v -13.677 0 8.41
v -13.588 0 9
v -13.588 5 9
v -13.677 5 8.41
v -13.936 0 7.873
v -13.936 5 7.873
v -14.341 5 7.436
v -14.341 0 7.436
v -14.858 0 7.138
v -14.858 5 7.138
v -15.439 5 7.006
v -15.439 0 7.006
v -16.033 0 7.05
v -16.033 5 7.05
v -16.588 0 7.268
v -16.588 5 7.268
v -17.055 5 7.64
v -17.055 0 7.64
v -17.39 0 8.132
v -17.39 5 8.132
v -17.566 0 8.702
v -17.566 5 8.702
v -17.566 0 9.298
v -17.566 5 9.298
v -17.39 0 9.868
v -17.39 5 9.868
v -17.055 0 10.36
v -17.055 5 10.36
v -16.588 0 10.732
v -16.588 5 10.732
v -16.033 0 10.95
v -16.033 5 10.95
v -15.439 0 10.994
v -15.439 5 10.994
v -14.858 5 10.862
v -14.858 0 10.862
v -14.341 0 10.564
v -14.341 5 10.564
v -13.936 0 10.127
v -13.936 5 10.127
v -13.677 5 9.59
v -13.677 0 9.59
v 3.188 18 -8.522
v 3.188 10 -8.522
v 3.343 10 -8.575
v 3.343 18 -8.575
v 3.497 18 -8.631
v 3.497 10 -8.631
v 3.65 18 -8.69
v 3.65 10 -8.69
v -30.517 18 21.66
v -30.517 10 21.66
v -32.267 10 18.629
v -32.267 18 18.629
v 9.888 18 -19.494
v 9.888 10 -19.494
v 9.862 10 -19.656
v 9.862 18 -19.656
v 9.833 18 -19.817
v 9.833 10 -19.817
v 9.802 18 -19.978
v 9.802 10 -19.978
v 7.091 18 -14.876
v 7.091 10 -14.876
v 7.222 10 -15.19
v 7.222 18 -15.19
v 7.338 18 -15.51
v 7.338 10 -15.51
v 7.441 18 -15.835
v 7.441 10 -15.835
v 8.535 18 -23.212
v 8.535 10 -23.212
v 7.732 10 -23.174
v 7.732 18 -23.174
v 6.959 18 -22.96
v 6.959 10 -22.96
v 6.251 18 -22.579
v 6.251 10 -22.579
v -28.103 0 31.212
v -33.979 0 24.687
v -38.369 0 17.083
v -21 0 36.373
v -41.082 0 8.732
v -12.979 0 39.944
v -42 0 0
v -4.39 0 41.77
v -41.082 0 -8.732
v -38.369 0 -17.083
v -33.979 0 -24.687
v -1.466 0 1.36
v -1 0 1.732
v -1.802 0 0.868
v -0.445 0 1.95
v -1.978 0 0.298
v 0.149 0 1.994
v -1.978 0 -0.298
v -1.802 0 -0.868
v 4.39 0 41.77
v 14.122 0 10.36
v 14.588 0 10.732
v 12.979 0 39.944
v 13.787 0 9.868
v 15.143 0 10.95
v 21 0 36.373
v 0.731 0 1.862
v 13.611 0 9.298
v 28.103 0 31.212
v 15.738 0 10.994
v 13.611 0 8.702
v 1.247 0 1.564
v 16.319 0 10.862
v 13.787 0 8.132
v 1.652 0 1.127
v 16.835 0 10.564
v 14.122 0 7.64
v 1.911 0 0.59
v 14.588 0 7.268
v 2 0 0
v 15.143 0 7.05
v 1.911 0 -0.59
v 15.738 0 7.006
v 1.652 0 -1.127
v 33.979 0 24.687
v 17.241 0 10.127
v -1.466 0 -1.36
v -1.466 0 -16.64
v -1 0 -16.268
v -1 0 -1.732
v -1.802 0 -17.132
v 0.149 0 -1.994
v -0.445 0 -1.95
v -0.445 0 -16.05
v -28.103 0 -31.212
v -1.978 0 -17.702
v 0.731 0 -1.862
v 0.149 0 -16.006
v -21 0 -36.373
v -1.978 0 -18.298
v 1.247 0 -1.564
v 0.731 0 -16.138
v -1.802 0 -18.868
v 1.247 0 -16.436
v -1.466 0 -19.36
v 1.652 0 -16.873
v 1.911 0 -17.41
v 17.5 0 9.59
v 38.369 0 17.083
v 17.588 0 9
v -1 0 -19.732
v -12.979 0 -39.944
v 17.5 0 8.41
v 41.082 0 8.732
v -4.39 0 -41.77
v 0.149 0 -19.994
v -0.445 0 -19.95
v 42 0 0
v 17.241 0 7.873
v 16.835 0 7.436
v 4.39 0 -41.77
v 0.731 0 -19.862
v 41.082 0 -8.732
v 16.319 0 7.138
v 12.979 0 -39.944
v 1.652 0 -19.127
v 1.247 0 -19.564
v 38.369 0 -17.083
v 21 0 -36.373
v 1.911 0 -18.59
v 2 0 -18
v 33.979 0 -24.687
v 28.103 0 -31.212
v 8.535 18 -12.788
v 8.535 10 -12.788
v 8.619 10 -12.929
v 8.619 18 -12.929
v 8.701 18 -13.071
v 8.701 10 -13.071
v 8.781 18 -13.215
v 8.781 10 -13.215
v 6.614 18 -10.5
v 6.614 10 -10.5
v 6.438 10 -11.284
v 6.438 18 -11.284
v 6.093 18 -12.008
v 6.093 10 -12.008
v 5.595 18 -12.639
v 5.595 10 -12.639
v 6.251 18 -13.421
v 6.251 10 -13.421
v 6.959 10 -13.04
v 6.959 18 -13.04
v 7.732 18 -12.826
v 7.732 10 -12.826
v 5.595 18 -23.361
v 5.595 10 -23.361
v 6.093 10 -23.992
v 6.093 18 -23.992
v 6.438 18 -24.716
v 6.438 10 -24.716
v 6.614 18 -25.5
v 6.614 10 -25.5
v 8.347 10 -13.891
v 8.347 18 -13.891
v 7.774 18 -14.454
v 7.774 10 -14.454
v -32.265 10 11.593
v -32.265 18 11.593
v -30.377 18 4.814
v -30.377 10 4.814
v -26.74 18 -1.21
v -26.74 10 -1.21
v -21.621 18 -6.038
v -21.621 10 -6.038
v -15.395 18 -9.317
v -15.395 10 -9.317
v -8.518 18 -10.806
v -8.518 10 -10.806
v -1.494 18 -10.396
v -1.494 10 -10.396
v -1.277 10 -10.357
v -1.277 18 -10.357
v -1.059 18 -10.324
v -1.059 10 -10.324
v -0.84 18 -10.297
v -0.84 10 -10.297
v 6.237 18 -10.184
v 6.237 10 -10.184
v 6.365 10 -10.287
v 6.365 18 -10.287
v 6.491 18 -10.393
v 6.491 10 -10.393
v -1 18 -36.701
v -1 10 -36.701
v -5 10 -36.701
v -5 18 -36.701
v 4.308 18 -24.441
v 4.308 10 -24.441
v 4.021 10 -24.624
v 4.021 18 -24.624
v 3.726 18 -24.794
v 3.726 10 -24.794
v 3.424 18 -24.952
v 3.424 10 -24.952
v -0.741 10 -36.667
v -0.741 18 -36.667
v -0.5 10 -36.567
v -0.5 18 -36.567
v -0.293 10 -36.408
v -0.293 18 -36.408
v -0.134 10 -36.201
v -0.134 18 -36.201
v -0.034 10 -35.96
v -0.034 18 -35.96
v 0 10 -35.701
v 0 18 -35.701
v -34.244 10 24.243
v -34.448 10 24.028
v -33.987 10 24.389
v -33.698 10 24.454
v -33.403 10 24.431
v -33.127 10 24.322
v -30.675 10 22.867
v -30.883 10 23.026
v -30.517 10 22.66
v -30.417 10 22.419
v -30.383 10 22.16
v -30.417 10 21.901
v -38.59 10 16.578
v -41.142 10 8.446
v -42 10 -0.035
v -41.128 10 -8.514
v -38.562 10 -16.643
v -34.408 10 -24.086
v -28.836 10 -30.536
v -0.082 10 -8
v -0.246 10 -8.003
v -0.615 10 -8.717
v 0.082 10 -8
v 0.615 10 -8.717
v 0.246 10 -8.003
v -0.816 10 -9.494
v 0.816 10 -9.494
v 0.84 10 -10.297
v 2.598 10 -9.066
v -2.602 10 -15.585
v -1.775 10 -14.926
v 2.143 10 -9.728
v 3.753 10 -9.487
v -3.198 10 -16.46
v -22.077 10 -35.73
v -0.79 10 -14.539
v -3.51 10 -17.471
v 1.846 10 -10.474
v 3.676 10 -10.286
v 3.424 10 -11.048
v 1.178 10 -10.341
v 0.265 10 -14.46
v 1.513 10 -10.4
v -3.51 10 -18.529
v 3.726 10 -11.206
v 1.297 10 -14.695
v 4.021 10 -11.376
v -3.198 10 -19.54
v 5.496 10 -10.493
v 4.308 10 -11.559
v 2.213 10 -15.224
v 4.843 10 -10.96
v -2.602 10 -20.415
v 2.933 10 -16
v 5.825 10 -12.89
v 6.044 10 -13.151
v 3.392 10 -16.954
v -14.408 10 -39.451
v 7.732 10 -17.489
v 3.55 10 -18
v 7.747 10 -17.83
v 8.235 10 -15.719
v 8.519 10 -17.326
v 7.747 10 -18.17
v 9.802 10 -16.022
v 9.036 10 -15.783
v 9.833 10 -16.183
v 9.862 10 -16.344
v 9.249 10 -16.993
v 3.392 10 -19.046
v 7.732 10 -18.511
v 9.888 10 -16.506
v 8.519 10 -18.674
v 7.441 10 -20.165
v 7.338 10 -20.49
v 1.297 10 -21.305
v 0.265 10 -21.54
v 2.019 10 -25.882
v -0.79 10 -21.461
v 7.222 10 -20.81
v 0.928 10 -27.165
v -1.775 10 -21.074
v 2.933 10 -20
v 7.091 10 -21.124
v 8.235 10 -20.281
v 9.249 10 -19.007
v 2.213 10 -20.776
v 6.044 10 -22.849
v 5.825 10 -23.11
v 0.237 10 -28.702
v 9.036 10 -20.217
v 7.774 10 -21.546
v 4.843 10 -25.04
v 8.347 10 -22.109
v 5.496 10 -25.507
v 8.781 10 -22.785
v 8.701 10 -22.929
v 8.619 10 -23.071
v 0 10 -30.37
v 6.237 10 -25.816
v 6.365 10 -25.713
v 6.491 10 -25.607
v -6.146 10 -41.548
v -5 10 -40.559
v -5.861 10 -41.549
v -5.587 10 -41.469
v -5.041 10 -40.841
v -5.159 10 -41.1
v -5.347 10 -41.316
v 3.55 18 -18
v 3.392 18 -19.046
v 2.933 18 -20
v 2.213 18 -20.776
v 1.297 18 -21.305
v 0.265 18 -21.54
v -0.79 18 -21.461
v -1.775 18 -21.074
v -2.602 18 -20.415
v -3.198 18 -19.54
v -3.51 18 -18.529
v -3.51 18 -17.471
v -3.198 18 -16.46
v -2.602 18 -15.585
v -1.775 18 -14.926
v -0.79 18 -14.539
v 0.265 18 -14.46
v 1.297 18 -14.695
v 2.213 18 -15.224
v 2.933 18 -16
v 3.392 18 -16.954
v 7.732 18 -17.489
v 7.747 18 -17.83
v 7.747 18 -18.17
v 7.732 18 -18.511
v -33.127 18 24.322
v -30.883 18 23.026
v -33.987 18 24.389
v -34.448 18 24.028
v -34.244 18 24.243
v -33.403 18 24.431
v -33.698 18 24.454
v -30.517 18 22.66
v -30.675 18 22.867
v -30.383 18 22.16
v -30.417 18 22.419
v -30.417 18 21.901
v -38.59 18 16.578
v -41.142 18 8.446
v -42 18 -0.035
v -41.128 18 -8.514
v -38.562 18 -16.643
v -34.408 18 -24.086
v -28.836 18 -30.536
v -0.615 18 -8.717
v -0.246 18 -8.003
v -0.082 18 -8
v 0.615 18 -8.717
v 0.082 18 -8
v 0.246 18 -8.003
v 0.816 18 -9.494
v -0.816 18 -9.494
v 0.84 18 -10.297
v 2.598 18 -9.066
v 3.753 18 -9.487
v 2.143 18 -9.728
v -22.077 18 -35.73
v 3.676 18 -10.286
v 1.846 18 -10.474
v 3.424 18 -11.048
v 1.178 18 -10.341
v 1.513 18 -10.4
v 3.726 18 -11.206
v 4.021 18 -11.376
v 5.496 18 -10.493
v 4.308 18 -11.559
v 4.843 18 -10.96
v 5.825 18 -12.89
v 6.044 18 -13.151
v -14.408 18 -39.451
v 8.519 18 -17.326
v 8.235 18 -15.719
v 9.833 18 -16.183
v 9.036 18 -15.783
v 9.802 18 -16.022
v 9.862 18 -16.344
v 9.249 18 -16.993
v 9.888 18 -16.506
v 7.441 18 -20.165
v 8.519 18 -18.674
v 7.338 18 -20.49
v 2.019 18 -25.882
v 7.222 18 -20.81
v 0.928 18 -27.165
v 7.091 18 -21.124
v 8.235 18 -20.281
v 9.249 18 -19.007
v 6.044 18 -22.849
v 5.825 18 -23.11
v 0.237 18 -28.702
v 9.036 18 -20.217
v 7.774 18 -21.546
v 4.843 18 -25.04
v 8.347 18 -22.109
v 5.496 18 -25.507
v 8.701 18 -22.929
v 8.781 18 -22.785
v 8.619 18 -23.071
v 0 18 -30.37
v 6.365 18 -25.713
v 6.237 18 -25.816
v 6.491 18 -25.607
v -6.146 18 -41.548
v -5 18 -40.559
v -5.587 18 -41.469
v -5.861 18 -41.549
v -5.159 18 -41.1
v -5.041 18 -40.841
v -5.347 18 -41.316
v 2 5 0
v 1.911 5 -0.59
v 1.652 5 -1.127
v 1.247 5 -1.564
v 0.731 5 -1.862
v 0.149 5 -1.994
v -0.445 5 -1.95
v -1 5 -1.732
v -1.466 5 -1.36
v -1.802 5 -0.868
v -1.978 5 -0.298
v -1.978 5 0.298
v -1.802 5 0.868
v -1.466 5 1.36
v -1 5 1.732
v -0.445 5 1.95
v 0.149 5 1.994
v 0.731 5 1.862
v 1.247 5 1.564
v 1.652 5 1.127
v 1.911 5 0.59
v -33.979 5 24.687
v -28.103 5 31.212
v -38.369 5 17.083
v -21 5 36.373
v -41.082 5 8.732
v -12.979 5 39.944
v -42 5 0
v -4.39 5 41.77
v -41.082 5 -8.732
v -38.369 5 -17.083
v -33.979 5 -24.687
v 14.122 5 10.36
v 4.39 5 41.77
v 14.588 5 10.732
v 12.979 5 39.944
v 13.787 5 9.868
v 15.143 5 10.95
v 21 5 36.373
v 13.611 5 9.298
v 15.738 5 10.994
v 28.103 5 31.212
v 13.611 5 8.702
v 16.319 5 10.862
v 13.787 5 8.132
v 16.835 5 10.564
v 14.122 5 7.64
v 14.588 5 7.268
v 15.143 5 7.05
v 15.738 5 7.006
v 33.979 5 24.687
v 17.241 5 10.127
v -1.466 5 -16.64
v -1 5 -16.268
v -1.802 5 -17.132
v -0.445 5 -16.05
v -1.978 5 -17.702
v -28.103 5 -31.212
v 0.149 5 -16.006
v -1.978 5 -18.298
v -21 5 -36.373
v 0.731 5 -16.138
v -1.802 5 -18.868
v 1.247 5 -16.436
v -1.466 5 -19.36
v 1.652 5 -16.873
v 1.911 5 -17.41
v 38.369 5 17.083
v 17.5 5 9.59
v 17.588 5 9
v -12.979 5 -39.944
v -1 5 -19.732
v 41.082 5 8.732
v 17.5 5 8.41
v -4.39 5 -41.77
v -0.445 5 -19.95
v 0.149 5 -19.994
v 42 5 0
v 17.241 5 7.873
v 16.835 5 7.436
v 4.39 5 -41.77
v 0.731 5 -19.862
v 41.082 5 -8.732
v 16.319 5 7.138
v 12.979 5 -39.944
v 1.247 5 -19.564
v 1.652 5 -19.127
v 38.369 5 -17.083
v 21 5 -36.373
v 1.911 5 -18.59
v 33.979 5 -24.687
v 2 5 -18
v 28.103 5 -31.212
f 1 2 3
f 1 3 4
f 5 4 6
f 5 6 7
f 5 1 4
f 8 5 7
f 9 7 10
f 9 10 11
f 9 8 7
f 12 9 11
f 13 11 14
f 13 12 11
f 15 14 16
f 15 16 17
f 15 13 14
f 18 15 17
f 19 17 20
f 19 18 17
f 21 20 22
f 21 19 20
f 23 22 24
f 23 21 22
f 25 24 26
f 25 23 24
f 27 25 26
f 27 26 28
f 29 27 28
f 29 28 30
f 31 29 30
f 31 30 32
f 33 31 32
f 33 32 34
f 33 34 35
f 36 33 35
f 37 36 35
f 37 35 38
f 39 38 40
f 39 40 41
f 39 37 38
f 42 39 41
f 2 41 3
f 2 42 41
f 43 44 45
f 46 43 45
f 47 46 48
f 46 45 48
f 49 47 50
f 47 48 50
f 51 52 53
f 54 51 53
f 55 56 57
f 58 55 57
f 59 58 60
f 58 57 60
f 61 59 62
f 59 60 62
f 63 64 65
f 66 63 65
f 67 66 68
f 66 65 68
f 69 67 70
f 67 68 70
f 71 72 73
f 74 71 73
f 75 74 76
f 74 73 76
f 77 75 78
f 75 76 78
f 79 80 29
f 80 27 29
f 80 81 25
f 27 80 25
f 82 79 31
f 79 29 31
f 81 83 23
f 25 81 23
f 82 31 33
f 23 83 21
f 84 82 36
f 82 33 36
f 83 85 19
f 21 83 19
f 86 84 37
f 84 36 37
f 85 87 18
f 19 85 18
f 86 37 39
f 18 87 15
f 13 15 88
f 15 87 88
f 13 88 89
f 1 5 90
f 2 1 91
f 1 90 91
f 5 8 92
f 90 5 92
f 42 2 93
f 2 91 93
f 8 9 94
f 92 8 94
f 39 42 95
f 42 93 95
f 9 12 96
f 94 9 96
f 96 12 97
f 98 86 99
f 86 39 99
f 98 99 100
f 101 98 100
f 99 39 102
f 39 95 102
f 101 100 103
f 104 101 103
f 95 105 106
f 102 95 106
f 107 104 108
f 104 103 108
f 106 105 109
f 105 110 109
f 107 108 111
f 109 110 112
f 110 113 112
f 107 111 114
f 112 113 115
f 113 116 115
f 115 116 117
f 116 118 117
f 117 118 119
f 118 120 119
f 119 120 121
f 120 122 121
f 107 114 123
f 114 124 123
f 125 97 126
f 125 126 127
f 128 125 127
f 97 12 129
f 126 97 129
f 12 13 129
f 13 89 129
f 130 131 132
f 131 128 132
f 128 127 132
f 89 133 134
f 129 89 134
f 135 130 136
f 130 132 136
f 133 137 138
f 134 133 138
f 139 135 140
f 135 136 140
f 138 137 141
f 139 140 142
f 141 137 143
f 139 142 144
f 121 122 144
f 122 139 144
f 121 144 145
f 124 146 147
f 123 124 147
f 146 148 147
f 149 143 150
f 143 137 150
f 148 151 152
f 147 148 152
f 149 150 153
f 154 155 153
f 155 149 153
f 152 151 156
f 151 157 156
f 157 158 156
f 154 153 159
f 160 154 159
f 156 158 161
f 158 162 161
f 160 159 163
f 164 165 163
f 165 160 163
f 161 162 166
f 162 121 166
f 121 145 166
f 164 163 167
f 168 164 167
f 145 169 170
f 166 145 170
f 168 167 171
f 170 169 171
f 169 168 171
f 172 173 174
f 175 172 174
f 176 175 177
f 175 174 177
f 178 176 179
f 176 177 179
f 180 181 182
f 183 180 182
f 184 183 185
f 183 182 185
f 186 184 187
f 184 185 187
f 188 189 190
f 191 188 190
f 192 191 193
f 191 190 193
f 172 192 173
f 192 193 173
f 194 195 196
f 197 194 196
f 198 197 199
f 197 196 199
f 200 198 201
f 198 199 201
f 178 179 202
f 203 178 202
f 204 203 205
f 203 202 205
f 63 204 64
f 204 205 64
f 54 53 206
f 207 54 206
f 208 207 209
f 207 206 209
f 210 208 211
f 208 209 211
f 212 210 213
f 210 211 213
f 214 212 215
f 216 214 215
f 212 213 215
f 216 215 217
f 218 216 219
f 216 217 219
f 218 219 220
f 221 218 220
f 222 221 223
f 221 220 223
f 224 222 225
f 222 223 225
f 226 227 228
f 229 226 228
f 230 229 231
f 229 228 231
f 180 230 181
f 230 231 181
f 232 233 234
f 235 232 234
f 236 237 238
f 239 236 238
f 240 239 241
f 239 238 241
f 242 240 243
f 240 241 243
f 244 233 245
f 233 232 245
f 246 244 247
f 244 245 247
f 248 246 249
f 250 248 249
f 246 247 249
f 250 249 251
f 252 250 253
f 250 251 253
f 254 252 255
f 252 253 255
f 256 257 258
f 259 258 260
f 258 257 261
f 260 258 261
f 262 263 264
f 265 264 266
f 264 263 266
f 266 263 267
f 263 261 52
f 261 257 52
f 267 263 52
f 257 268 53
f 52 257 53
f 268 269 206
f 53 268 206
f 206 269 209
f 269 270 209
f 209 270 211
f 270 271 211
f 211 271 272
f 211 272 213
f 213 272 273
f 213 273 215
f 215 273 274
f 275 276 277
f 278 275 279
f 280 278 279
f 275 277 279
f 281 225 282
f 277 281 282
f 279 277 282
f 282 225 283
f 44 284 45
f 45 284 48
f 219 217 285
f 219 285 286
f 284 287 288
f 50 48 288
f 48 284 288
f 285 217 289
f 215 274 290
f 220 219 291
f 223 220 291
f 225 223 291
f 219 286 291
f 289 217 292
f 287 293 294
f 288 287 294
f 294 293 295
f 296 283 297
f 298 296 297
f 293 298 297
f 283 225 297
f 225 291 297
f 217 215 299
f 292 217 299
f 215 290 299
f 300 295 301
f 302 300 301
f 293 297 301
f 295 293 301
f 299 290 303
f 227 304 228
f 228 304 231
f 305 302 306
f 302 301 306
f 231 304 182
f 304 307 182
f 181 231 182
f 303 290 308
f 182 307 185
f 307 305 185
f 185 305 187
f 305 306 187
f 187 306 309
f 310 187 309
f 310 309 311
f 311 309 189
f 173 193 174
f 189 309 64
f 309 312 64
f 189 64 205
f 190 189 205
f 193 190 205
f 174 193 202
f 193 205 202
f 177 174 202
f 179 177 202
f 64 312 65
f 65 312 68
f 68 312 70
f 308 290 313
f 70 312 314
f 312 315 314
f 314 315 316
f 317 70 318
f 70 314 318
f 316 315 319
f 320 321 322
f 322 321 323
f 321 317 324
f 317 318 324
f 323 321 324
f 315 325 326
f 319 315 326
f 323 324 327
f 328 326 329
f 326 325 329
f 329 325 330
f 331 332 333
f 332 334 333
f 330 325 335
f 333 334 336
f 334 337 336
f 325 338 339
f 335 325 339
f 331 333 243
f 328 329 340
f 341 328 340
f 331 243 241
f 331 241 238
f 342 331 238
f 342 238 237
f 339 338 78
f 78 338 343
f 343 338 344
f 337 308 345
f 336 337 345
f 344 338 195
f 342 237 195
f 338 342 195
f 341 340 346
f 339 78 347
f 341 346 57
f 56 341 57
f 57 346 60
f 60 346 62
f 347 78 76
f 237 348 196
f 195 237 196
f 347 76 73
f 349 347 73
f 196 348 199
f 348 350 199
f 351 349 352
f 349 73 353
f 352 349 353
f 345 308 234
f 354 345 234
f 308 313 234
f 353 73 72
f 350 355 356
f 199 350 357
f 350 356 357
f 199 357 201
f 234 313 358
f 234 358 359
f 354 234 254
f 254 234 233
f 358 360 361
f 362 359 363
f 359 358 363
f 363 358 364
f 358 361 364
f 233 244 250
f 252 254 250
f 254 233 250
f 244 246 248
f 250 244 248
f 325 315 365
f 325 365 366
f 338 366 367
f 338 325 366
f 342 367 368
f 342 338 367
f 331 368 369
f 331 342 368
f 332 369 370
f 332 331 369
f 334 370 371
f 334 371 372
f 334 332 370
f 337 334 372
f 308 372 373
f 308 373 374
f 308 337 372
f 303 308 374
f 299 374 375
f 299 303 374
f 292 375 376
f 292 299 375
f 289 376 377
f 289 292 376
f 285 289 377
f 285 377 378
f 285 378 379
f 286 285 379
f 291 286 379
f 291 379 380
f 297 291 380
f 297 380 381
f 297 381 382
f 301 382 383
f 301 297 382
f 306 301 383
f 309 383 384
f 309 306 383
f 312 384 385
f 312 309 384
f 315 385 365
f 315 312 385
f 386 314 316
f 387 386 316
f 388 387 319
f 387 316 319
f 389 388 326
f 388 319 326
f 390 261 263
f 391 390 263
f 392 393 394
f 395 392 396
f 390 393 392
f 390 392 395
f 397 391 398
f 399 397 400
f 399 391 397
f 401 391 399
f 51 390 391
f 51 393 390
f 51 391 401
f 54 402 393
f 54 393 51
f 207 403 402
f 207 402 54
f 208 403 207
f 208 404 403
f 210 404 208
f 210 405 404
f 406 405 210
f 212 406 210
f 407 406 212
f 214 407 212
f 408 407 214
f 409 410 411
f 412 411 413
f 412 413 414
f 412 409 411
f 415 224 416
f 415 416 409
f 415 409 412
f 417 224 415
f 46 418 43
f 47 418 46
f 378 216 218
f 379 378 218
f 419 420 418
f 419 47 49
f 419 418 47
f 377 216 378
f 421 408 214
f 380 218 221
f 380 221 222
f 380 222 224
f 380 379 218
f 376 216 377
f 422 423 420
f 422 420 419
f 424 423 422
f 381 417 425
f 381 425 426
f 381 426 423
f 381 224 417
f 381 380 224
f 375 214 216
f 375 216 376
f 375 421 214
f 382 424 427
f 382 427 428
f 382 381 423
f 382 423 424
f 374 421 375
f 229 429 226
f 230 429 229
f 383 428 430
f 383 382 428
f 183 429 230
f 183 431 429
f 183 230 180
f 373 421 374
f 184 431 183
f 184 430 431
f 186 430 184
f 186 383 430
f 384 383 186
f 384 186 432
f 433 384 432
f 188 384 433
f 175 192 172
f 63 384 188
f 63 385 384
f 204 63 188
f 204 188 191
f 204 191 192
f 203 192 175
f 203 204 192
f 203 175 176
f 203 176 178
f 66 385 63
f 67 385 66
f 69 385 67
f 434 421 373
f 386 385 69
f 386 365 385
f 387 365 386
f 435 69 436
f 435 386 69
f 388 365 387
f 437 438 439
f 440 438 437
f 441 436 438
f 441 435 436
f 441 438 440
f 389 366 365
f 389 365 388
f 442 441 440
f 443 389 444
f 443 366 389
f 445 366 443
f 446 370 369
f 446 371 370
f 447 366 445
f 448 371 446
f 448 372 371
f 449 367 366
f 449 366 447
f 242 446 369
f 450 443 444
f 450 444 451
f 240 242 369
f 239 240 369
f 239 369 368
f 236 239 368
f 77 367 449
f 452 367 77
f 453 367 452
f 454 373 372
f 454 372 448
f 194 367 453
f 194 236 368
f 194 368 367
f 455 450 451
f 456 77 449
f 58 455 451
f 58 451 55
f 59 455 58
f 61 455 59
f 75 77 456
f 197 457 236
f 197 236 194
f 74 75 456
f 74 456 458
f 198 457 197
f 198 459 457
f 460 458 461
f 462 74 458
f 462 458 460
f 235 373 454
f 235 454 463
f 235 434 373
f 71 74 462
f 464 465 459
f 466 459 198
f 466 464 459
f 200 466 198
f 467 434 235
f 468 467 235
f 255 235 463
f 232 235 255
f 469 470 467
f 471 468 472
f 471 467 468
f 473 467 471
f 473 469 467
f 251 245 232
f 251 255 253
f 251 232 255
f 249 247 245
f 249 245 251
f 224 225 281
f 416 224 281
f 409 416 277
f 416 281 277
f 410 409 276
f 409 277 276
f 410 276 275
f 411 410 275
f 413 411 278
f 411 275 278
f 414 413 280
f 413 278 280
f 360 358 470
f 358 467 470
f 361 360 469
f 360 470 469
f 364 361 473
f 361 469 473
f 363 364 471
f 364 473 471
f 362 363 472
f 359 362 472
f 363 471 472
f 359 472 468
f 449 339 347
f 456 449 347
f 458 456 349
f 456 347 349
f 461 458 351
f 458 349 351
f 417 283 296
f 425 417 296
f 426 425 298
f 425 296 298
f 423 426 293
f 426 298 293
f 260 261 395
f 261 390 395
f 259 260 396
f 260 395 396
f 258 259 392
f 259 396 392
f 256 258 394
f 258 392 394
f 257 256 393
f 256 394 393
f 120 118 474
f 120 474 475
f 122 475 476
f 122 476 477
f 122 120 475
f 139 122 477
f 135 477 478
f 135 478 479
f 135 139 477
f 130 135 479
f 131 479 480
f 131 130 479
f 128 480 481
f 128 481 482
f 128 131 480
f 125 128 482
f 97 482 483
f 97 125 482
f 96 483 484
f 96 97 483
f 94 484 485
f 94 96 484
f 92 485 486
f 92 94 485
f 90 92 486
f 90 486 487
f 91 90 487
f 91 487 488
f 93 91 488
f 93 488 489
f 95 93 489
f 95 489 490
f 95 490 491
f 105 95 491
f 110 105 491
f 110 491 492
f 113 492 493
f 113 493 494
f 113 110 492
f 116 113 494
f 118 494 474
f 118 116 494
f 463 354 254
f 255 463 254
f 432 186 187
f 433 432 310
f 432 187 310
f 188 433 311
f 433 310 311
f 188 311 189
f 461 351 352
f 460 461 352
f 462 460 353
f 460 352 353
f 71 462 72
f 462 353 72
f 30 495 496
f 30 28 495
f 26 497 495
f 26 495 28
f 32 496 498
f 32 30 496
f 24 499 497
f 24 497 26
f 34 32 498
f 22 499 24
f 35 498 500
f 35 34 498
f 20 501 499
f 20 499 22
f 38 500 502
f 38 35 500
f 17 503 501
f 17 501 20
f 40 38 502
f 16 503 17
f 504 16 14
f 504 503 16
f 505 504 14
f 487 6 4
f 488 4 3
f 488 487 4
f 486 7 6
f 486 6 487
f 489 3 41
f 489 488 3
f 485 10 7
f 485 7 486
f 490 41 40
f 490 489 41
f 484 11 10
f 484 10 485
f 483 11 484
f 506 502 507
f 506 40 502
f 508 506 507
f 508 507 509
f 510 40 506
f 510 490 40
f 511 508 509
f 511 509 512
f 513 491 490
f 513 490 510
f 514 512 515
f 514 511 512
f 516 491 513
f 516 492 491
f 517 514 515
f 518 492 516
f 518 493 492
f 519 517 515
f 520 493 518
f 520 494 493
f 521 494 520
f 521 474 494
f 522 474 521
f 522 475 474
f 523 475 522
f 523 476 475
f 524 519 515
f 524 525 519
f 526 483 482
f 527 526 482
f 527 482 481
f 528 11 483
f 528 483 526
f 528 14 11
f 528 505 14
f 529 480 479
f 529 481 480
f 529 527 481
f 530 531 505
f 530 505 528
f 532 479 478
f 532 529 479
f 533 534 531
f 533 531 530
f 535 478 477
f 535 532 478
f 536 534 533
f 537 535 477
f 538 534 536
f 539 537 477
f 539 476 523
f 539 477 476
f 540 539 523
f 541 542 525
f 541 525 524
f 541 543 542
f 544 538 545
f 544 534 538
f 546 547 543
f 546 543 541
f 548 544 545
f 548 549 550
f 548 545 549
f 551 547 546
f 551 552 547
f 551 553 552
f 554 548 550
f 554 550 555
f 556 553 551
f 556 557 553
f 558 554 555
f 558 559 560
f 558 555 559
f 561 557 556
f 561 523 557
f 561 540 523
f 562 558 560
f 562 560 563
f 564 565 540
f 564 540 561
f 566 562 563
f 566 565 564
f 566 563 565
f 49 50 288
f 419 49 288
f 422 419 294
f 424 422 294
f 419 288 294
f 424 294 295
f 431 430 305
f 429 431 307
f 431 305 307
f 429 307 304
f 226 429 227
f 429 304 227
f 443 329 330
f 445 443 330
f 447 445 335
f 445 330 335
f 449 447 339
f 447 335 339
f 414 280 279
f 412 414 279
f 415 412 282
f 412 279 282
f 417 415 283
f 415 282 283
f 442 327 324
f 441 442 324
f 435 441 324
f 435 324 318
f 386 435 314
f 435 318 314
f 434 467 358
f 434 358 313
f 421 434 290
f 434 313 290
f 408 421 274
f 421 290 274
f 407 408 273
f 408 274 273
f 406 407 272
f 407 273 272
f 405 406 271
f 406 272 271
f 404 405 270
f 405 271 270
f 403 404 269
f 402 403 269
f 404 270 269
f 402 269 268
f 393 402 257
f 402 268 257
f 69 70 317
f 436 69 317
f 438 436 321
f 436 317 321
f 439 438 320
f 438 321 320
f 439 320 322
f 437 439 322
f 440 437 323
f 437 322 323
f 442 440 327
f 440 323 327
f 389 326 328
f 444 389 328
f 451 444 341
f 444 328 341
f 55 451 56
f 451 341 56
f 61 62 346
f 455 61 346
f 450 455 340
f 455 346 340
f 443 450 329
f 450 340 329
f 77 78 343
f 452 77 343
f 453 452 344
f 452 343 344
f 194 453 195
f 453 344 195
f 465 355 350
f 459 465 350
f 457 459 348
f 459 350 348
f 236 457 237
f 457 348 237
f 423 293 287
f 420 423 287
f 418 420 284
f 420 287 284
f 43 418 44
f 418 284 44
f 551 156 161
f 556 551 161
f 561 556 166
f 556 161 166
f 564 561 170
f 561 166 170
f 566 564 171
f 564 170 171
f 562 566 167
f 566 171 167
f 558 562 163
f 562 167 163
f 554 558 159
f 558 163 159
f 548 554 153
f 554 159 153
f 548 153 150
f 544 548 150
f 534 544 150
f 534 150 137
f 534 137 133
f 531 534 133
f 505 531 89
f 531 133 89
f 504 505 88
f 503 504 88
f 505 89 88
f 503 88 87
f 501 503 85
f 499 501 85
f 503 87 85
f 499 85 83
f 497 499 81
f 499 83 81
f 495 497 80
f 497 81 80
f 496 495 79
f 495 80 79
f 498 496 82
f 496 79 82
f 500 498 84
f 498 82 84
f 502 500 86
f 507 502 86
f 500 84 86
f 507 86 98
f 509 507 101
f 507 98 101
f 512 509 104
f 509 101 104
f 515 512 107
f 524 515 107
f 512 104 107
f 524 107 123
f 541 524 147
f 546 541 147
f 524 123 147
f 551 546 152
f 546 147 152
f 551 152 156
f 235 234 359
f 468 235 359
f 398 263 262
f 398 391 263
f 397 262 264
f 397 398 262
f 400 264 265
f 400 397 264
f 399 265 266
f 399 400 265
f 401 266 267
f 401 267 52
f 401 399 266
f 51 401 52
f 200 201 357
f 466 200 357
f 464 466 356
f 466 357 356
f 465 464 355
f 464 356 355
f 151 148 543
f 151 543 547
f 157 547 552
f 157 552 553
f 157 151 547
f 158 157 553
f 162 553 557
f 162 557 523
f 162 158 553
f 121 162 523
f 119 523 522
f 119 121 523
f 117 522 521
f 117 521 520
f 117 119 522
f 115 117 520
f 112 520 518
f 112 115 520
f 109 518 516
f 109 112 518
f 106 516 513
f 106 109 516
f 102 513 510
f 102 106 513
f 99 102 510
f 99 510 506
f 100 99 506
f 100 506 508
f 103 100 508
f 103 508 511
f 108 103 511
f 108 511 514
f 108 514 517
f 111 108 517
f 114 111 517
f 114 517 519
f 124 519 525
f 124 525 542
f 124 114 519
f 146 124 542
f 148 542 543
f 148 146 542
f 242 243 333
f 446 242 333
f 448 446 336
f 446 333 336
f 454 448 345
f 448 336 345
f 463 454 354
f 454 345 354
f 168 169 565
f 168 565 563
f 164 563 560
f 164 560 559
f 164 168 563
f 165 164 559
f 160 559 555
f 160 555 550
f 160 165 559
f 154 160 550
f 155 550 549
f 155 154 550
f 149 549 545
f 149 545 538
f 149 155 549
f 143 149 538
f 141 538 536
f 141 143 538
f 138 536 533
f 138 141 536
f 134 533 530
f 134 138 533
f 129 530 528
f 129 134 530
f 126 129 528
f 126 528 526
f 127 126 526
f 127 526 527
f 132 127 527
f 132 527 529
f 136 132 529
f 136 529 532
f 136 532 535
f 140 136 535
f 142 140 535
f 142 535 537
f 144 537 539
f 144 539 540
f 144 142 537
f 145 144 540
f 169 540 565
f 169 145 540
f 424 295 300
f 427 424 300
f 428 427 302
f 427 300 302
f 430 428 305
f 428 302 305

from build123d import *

# Parameters (mm, degrees)
SKETCH2_R           = 42
SKETCH2_R_2         = 2
BOSS_EXTRUDE1_DEPTH = 5
BOSS_EXTRUDE2_START = 5
SKETCH6_R           = 3.55
BOSS_EXTRUDE2_DEPTH = 8
FILLET1_R           = 1


with BuildPart() as part:
    # Sketch2 → Boss-Extrude1 (new body)
    with BuildSketch(Plane(origin=(0, 0, 0), x_dir=(1, 0, 0), z_dir=(0, 1, 0))):
        Circle(SKETCH2_R)
        Circle(SKETCH2_R_2, mode=Mode.SUBTRACT)
        with Locations((0, 18)):
            Circle(SKETCH2_R_2, mode=Mode.SUBTRACT)
        with Locations((15.588457268, -9)):
            Circle(SKETCH2_R_2, mode=Mode.SUBTRACT)
        with Locations((-15.588457268, -9)):
            Circle(SKETCH2_R_2, mode=Mode.SUBTRACT)
    extrude(amount=BOSS_EXTRUDE1_DEPTH)


with BuildPart() as body_2:
    # Sketch6 → Boss-Extrude2 (new body)
    with BuildSketch(Plane(origin=(0, 5, 0), x_dir=(1, 0, 0), z_dir=(0, 1, 0)).offset(BOSS_EXTRUDE2_START)):
        with BuildLine():
            Line((-33.913690354, -24.776230678), (-30.016576037, -22.526230678))
            Line((-30.016576037, -22.526230678), (-32.266576037, -18.629116361))
            ThreePointArc((-32.266576037, -18.629116361), (-24.344871608, 3.797822705), (-1.493590746, 10.39630434))
            ThreePointArc((-1.493590746, 10.39630434), (-1.167754691, 10.339494143), (-0.839791165, 10.296640227))
            ThreePointArc((-0.839791165, 10.296640227), (-0.737032575, 9.099596424), (-0.246102251, 8.003028775))
            ThreePointArc((-0.246102251, 8.003028775), (0, 8), (0.246102251, 8.003028775))
            ThreePointArc((0.246102251, 8.003028775), (0.737032575, 9.099596424), (0.839791165, 10.296640227))
            ThreePointArc((0.839791165, 10.296640227), (1.345599729, 10.368724722), (1.845558653, 10.473984171))
            ThreePointArc((1.845558653, 10.473984171), (2.351533235, 9.384276451), (3.187905062, 8.521747982))
            ThreePointArc((3.187905062, 8.521747982), (3.420201433, 8.603073792), (3.650426001, 8.690091837))
            ThreePointArc((3.650426001, 8.690091837), (3.736701378, 9.888436425), (3.423849775, 11.04843516))
            ThreePointArc((3.423849775, 11.04843516), (3.8745, 11.289169146), (4.30830686, 11.559076697))
            ThreePointArc((4.30830686, 11.559076697), (5.156469432, 10.708139892), (6.237403976, 10.183684267))
            ThreePointArc((6.237403976, 10.183684267), (6.427876097, 10.339555569), (6.6144545, 10.500067223))
            ThreePointArc((6.6144545, 10.500067223), (6.285668848, 11.655650706), (5.594941571, 12.638691408))
            ThreePointArc((5.594941571, 12.638691408), (5.93607839, 13.019038813), (6.251409676, 13.42103963))
            ThreePointArc((6.251409676, 13.42103963), (7.339459313, 12.911509279), (8.534579916, 12.788383586))
            ThreePointArc((8.534579916, 12.788383586), (8.660254038, 13), (8.780682168, 13.214645189))
            ThreePointArc((8.780682168, 13.214645189), (8.076491888, 14.188087145), (7.091200841, 14.875600596))
            ThreePointArc((7.091200841, 14.875600596), (7.281678118, 15.349685909), (7.440500224, 15.835292763))
            ThreePointArc((7.440500224, 15.835292763), (8.637202083, 15.728625745), (9.802359562, 16.021680759))
            ThreePointArc((9.802359562, 16.021680759), (9.84807753, 16.263518223), (9.887829977, 16.50640757))
            ThreePointArc((9.887829977, 16.50640757), (8.89317081, 17.180296532), (7.732156635, 17.489358464))
            ThreePointArc((7.732156635, 17.489358464), (7.749, 18), (7.732156635, 18.510641536))
            ThreePointArc((7.732156635, 18.510641536), (8.89317081, 18.819703468), (9.887829977, 19.49359243))
            ThreePointArc((9.887829977, 19.49359243), (9.84807753, 19.736481777), (9.802359562, 19.978319241))
            ThreePointArc((9.802359562, 19.978319241), (8.637202083, 20.271374255), (7.440500224, 20.164707237))
            ThreePointArc((7.440500224, 20.164707237), (7.281678118, 20.650314091), (7.091200841, 21.124399404))
            ThreePointArc((7.091200841, 21.124399404), (8.076491888, 21.811912855), (8.780682168, 22.785354811))
            ThreePointArc((8.780682168, 22.785354811), (8.660254038, 23), (8.534579916, 23.211616414))
            ThreePointArc((8.534579916, 23.211616414), (7.339459313, 23.088490721), (6.251409676, 22.57896037))
            ThreePointArc((6.251409676, 22.57896037), (5.93607839, 22.980961187), (5.594941571, 23.361308592))
            ThreePointArc((5.594941571, 23.361308592), (6.285668848, 24.344349294), (6.6144545, 25.499932777))
            ThreePointArc((6.6144545, 25.499932777), (6.427876097, 25.660444431), (6.237403976, 25.816315733))
            ThreePointArc((6.237403976, 25.816315733), (5.156469432, 25.291860108), (4.30830686, 24.440923303))
            ThreePointArc((4.30830686, 24.440923303), (3.8745, 24.710830854), (3.423849775, 24.95156484))
            ThreePointArc((3.423849775, 24.95156484), (0.92767798, 27.165444269), (0, 30.37037006))
            Line((0, 30.37037006), (0, 36.701318924))
            Line((0, 36.701318924), (-5, 36.701318924))
            Line((-5, 36.701318924), (-5, 41.701318924))
            ThreePointArc((-5, 41.701318924), (-38.514737108, 16.751567852), (-33.913690354, -24.776230678))
        make_face()
        with Locations((0, 18)):
            Circle(SKETCH6_R, mode=Mode.SUBTRACT)
    extrude(amount=BOSS_EXTRUDE2_DEPTH)

    # Fillet1
    fillet1_edges = [body_2.edges().sort_by_distance(p)[0] for p in [
        (-30.016576037, 14, 22.526230678),
        (-33.913690354, 14, 24.776230678),
        (-5, 14, -41.701318924),
        (0, 14, -36.701318924),
    ]]
    fillet(fillet1_edges, radius=FILLET1_R)


solid = Compound([part.part, body_2.part])
